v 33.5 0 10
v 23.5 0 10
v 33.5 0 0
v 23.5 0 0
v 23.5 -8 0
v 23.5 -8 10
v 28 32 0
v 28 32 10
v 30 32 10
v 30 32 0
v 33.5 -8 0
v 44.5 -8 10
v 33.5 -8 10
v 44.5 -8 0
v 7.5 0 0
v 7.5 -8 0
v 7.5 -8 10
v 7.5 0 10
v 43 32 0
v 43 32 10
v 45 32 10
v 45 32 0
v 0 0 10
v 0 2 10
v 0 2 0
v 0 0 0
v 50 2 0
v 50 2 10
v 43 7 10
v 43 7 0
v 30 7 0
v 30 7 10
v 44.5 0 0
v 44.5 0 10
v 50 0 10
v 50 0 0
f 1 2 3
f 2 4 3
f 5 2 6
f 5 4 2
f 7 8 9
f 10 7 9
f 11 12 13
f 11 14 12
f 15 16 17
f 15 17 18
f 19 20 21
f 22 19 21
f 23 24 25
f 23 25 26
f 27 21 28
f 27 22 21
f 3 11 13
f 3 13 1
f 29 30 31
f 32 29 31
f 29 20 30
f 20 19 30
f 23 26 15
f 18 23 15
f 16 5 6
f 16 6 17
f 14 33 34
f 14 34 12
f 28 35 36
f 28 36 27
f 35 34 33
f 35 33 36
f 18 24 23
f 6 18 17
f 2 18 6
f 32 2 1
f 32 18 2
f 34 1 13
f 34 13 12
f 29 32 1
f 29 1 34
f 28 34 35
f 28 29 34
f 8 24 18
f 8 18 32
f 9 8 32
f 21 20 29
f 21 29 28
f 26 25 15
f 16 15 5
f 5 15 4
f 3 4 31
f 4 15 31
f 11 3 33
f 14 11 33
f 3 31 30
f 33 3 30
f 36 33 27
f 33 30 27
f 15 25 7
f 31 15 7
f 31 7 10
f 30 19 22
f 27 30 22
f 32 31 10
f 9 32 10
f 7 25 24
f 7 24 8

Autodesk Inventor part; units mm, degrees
ref_plane "YZ Plane" through (0, 0, 0) normal (1, 0, 0) x (0, 1, 0)
ref_plane "XZ Plane" through (0, 0, 0) normal (0, 1, 0) x (-1, 0, 0)
ref_plane "XY Plane" through (0, 0, 0) normal (0, 0, 1) x (1, 0, 0)
sketch "Esquisse1" plane through (0, 0, 0) normal (0, 0, 1) x (1, 0, 0)
  line L0 (50, 0) -> (50, 2)
  line L1 (0, 2) -> (0, 0)
  line L2 (43, 32) -> (43, 7)
  line L3 (43, 7) -> (30, 7)
  line L4 (30, 7) -> (30, 32)
  line L5 (28, 32) -> (30, 32)
  line L6 (43, 32) -> (45, 32)
  line L7 (0, 2) -> (50, 2) construction
  line L8 (0, 2) -> (28, 32)
  line L9 (45, 32) -> (50, 2)
  line L10 (23.5, 0) -> (23.5, -8)
  line L11 (23.5, -8) -> (7.5, -8)
  line L12 (7.5, -8) -> (7.5, 0)
  line L13 (44.5, 0) -> (44.5, -8)
  line L14 (44.5, -8) -> (33.5, -8)
  line L15 (33.5, -8) -> (33.5, 0)
  line L16 (0, 0) -> (7.5, 0)
  line L17 (23.5, 0) -> (33.5, 0)
  line L18 (44.5, 0) -> (50, 0)
  dimension "d10" = 50
  dimension "d12" = 13
  dimension "d13" = 7
  dimension "d14" = 25
  dimension "d15" = 25
  dimension "d21" = 16
  dimension "d23" = 7.5
  dimension "d24" = 11
  dimension "d26" = 5.5
  dimension "d27" = 7
  dimension "d28" = 8
  dimension "d29" = 8
  dimension "d30" = 8
  dimension "d31" = 8
  dimension "d34" = 80.538
  dimension "d35" = 30
  dimension "d36" = 46.975
extrude "Extrusion1" add sketch "Esquisse1" along normal blind 10
properties part number "Support_motor_front_ground"
